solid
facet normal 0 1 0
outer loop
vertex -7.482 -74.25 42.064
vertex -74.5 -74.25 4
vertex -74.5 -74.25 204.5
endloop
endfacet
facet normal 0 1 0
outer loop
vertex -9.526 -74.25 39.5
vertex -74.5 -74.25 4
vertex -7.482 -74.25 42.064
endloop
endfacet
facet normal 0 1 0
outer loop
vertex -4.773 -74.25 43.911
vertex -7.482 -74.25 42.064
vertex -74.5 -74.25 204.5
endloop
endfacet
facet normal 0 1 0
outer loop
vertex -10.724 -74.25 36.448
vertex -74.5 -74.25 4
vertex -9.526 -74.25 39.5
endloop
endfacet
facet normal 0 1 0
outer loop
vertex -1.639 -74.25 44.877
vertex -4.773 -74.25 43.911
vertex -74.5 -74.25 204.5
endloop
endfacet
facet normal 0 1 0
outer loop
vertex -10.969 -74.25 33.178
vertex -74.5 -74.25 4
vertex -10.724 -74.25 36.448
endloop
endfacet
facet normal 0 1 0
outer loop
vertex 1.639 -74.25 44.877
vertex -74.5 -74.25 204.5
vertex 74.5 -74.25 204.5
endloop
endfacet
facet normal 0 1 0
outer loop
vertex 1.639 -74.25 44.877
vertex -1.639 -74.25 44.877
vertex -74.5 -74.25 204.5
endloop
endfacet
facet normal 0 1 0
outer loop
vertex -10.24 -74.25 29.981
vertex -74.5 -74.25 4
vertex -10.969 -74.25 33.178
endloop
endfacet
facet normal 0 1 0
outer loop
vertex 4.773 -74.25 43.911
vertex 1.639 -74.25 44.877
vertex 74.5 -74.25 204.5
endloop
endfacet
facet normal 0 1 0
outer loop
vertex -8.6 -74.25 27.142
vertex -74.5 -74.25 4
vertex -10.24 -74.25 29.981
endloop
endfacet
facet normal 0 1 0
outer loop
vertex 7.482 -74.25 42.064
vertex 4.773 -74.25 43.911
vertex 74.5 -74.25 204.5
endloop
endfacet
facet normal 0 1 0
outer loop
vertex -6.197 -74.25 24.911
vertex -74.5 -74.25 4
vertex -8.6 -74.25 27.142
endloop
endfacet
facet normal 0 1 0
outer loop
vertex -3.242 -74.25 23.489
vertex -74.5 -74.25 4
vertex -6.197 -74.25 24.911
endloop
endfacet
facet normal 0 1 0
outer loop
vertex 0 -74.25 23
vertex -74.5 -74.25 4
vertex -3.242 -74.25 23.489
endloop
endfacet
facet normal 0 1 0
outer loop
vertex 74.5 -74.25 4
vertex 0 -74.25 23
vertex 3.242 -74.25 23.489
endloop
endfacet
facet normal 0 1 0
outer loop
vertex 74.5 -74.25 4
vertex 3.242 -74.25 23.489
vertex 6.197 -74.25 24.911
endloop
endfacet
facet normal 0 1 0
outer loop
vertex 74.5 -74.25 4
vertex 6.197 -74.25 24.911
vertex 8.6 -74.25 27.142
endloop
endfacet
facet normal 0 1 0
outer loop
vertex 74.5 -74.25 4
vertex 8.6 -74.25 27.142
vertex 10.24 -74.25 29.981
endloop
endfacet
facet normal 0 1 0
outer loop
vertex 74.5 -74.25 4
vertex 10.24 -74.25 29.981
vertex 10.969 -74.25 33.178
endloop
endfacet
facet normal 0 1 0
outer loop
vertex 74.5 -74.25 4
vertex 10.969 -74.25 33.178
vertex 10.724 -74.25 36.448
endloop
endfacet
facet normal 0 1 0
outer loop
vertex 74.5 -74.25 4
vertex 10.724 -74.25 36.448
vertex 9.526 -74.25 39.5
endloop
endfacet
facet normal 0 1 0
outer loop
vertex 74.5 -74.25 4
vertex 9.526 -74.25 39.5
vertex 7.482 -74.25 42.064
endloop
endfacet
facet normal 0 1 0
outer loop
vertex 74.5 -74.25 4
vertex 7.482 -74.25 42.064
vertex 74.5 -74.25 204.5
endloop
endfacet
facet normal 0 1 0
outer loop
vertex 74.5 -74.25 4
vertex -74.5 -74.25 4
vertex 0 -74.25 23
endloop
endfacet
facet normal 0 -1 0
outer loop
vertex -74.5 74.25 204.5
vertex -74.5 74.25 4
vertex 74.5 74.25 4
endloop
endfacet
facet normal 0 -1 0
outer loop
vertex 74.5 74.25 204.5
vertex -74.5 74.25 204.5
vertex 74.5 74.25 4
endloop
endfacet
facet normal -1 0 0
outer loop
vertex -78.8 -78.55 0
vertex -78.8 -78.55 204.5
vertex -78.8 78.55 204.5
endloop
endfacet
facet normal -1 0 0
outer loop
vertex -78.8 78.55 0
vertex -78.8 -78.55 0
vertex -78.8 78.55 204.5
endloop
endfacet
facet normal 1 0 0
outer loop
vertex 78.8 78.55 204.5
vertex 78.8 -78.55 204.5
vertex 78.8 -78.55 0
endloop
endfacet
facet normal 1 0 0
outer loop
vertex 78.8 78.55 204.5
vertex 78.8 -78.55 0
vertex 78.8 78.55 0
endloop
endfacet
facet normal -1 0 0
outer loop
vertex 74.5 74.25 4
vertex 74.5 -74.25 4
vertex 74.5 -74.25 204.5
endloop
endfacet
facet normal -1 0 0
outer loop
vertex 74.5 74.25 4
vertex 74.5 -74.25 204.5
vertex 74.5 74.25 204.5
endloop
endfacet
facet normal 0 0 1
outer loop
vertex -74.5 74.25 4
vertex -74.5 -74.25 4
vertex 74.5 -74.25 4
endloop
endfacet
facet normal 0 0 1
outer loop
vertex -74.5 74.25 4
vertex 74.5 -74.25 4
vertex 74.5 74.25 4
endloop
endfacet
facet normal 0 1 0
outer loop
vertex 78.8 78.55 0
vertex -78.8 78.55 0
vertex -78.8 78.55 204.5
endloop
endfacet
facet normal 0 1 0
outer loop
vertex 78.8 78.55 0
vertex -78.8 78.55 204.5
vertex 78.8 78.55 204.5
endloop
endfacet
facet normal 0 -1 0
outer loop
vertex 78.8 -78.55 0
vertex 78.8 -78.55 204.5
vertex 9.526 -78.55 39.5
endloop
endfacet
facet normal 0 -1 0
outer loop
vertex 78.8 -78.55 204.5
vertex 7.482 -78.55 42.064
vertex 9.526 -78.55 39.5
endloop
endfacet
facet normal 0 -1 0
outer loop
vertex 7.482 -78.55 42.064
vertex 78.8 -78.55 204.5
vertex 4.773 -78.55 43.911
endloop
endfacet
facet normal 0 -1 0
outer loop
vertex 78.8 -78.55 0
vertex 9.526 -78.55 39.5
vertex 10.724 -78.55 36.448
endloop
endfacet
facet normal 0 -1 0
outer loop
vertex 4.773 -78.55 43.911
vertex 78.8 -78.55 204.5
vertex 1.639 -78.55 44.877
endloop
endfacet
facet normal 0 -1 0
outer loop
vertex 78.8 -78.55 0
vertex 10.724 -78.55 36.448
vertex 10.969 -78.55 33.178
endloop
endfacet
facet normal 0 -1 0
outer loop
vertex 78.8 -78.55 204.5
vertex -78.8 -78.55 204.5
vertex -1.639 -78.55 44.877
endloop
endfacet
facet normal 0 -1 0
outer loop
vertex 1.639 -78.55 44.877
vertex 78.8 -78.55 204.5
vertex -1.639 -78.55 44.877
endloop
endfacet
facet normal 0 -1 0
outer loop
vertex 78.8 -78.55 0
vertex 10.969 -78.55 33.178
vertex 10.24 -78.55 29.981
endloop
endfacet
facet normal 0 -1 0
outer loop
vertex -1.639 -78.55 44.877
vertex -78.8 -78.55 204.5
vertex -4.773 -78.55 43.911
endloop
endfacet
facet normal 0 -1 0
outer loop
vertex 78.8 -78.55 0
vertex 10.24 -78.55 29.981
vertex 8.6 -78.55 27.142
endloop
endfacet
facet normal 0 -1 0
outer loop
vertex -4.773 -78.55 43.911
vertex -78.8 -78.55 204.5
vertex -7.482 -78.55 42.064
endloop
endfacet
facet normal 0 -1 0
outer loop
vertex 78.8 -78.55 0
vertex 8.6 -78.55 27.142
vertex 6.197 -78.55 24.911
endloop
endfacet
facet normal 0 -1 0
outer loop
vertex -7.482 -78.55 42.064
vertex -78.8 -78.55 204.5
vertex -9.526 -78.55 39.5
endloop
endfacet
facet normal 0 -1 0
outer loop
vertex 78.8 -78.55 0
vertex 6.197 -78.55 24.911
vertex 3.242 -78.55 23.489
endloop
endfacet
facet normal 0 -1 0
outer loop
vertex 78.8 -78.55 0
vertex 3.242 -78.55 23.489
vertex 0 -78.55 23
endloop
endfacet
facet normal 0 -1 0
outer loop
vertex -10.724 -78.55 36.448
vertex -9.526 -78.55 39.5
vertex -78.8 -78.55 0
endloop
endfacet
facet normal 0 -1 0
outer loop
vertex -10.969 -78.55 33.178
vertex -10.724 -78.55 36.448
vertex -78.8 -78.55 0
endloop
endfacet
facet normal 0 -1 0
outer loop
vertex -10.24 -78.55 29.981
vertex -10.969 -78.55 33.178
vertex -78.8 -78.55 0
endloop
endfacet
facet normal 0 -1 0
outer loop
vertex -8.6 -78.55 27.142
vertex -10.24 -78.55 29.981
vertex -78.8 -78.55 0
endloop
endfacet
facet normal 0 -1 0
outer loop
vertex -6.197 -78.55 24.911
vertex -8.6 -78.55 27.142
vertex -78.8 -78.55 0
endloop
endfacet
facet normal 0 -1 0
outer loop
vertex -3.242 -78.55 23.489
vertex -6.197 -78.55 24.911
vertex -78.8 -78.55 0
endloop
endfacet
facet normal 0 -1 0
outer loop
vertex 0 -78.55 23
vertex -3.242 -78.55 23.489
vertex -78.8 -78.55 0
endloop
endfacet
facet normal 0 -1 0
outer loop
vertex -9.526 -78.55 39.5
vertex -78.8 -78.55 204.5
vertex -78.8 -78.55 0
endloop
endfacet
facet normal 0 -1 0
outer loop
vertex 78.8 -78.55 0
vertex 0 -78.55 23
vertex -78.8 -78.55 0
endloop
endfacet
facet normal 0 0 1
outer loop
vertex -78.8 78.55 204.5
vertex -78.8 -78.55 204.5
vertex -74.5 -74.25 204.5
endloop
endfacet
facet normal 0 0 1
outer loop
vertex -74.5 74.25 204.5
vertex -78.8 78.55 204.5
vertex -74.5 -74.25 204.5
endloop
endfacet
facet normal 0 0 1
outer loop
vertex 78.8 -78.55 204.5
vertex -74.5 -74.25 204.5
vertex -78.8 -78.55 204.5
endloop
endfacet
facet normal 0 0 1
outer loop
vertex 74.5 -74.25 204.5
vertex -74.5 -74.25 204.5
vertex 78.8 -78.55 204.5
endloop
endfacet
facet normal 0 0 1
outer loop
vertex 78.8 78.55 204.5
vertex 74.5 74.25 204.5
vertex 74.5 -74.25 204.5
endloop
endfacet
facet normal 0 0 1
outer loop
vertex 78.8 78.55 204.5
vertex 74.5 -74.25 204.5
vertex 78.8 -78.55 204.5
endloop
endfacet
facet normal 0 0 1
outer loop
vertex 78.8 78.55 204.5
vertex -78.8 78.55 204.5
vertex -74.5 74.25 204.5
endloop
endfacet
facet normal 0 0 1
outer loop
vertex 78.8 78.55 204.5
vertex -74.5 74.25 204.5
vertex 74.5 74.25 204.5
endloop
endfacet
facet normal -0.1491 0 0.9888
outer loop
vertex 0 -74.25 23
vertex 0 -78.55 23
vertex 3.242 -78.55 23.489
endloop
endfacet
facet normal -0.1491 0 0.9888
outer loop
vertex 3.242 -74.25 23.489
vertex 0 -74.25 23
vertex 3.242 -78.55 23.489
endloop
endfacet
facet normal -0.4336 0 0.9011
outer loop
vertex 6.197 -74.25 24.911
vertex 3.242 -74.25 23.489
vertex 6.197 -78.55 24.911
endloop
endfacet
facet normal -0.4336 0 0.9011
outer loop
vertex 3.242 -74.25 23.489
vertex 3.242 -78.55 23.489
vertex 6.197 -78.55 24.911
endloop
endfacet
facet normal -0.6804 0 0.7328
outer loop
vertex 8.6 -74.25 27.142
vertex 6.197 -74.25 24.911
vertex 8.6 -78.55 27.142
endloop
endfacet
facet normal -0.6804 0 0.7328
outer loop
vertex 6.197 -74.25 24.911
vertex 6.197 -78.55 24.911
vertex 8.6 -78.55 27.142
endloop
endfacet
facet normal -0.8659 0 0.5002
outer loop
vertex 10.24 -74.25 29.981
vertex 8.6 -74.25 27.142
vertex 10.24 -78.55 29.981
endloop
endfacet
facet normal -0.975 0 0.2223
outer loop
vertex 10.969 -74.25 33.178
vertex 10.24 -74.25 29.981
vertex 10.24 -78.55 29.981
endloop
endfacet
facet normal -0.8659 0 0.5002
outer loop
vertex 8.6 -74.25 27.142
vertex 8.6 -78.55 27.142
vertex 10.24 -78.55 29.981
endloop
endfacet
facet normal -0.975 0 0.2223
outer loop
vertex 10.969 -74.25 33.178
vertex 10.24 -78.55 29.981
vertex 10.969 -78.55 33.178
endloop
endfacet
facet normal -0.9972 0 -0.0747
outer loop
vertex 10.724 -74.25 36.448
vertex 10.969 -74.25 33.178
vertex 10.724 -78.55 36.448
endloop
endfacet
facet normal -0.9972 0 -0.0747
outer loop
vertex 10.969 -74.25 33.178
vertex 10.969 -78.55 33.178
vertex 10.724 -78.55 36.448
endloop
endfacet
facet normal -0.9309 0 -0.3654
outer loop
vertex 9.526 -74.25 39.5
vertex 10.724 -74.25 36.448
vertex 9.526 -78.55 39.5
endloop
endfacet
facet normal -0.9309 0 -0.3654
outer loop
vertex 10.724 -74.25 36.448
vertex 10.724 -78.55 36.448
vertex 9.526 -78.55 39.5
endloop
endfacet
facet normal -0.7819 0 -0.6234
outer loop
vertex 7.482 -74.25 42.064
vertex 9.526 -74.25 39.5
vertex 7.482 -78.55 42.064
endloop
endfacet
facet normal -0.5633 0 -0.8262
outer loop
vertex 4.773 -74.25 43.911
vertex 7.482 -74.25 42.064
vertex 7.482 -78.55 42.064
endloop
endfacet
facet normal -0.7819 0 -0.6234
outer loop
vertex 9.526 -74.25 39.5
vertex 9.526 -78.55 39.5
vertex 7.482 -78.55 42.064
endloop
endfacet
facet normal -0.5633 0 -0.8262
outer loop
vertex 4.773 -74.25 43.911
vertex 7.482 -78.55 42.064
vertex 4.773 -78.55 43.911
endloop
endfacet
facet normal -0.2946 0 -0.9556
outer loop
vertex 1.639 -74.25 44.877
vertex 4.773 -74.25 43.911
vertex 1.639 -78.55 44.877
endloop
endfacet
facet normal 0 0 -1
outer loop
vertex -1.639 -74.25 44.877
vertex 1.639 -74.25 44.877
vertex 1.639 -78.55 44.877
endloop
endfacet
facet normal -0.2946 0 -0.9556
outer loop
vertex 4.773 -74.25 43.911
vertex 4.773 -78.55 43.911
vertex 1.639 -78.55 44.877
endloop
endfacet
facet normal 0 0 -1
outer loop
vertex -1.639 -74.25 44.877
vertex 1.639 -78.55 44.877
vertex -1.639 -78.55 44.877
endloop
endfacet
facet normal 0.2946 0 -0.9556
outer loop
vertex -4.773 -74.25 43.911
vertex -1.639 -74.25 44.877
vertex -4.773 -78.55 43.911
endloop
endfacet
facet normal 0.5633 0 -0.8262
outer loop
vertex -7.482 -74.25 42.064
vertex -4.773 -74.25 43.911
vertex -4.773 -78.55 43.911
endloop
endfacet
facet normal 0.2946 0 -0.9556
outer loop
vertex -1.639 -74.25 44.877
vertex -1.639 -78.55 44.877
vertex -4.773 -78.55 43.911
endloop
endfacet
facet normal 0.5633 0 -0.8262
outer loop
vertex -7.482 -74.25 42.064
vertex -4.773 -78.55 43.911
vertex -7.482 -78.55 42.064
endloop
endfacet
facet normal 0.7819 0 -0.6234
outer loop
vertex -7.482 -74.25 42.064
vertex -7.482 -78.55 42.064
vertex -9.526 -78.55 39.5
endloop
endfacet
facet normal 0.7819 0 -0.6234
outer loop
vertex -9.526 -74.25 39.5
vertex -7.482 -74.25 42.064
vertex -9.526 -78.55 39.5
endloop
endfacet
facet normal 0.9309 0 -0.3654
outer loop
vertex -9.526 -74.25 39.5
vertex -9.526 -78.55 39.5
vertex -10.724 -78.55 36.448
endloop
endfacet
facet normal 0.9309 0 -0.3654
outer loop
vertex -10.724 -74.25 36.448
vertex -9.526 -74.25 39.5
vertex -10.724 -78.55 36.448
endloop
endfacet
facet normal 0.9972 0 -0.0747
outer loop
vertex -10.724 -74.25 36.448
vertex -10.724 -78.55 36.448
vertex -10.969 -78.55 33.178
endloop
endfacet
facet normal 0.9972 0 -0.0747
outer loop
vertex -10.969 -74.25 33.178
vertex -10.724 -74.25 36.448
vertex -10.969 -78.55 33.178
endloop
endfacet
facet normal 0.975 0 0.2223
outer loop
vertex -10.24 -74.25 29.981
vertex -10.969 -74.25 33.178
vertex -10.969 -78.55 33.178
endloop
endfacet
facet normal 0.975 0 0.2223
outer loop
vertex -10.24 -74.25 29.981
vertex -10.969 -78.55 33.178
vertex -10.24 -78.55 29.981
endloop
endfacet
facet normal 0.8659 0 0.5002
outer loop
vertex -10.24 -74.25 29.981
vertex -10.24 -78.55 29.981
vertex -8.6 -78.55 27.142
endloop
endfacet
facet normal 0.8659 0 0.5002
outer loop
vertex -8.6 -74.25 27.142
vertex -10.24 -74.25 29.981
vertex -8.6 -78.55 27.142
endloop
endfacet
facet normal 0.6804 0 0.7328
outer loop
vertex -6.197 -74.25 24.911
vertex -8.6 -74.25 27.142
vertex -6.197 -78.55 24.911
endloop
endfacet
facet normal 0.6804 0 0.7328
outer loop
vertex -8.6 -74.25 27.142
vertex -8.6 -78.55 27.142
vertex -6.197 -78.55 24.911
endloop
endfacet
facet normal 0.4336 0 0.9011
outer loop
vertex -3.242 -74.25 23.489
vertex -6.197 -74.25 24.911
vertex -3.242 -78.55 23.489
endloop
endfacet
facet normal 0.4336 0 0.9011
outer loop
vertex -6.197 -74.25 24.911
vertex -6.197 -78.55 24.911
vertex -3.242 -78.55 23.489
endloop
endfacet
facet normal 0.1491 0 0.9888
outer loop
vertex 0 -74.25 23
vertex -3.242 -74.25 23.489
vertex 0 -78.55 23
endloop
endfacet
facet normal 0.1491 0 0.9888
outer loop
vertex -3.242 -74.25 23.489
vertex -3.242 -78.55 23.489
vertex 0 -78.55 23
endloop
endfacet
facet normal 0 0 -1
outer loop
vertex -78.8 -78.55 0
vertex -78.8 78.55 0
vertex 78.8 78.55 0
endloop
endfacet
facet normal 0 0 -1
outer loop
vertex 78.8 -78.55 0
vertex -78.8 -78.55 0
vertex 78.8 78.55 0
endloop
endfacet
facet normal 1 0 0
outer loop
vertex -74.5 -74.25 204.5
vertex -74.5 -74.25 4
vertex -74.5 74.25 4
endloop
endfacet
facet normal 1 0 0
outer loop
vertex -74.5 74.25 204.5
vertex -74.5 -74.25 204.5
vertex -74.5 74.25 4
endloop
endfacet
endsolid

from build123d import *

# Parameters (mm, degrees)
CROQUIS1_W              = 157.6
CROQUIS1_H              = 157.1
CROQUIS1_W_2            = 149
CROQUIS1_H_2            = 148.5
SALIENTE_EXTRUIR1_DEPTH = 204.5
CROQUIS2_W              = 4
CROQUIS2_H              = 157.1
SALIENTE_EXTRUIR2_DEPTH = 149
CROQUIS3_R              = 11
CORTAR_EXTRUIR1_DEPTH   = 4.3


with BuildPart() as part:
    # Croquis1 → Saliente-Extruir1 (new body)
    with BuildSketch(Plane.XY):
        Rectangle(CROQUIS1_W, CROQUIS1_H)
        Rectangle(CROQUIS1_W_2, CROQUIS1_H_2, mode=Mode.SUBTRACT)
    extrude(amount=SALIENTE_EXTRUIR1_DEPTH)

    # Croquis2 → Saliente-Extruir2 (add)
    with BuildSketch(Plane(origin=(-74.5, 0, 0), x_dir=(0, 0, -1), z_dir=(1, 0, 0))):
        with Locations((-2, 0)):
            Rectangle(CROQUIS2_W, CROQUIS2_H)
    extrude(amount=SALIENTE_EXTRUIR2_DEPTH)

    # Croquis3 → Cortar-Extruir1 (cut)
    with BuildSketch(Plane.XZ.offset(78.55)):
        with Locations(Location((0, 34, 0), (0, 0, 270))):
            Circle(CROQUIS3_R)
    extrude(amount=-CORTAR_EXTRUIR1_DEPTH, mode=Mode.SUBTRACT)


solid = part.part
